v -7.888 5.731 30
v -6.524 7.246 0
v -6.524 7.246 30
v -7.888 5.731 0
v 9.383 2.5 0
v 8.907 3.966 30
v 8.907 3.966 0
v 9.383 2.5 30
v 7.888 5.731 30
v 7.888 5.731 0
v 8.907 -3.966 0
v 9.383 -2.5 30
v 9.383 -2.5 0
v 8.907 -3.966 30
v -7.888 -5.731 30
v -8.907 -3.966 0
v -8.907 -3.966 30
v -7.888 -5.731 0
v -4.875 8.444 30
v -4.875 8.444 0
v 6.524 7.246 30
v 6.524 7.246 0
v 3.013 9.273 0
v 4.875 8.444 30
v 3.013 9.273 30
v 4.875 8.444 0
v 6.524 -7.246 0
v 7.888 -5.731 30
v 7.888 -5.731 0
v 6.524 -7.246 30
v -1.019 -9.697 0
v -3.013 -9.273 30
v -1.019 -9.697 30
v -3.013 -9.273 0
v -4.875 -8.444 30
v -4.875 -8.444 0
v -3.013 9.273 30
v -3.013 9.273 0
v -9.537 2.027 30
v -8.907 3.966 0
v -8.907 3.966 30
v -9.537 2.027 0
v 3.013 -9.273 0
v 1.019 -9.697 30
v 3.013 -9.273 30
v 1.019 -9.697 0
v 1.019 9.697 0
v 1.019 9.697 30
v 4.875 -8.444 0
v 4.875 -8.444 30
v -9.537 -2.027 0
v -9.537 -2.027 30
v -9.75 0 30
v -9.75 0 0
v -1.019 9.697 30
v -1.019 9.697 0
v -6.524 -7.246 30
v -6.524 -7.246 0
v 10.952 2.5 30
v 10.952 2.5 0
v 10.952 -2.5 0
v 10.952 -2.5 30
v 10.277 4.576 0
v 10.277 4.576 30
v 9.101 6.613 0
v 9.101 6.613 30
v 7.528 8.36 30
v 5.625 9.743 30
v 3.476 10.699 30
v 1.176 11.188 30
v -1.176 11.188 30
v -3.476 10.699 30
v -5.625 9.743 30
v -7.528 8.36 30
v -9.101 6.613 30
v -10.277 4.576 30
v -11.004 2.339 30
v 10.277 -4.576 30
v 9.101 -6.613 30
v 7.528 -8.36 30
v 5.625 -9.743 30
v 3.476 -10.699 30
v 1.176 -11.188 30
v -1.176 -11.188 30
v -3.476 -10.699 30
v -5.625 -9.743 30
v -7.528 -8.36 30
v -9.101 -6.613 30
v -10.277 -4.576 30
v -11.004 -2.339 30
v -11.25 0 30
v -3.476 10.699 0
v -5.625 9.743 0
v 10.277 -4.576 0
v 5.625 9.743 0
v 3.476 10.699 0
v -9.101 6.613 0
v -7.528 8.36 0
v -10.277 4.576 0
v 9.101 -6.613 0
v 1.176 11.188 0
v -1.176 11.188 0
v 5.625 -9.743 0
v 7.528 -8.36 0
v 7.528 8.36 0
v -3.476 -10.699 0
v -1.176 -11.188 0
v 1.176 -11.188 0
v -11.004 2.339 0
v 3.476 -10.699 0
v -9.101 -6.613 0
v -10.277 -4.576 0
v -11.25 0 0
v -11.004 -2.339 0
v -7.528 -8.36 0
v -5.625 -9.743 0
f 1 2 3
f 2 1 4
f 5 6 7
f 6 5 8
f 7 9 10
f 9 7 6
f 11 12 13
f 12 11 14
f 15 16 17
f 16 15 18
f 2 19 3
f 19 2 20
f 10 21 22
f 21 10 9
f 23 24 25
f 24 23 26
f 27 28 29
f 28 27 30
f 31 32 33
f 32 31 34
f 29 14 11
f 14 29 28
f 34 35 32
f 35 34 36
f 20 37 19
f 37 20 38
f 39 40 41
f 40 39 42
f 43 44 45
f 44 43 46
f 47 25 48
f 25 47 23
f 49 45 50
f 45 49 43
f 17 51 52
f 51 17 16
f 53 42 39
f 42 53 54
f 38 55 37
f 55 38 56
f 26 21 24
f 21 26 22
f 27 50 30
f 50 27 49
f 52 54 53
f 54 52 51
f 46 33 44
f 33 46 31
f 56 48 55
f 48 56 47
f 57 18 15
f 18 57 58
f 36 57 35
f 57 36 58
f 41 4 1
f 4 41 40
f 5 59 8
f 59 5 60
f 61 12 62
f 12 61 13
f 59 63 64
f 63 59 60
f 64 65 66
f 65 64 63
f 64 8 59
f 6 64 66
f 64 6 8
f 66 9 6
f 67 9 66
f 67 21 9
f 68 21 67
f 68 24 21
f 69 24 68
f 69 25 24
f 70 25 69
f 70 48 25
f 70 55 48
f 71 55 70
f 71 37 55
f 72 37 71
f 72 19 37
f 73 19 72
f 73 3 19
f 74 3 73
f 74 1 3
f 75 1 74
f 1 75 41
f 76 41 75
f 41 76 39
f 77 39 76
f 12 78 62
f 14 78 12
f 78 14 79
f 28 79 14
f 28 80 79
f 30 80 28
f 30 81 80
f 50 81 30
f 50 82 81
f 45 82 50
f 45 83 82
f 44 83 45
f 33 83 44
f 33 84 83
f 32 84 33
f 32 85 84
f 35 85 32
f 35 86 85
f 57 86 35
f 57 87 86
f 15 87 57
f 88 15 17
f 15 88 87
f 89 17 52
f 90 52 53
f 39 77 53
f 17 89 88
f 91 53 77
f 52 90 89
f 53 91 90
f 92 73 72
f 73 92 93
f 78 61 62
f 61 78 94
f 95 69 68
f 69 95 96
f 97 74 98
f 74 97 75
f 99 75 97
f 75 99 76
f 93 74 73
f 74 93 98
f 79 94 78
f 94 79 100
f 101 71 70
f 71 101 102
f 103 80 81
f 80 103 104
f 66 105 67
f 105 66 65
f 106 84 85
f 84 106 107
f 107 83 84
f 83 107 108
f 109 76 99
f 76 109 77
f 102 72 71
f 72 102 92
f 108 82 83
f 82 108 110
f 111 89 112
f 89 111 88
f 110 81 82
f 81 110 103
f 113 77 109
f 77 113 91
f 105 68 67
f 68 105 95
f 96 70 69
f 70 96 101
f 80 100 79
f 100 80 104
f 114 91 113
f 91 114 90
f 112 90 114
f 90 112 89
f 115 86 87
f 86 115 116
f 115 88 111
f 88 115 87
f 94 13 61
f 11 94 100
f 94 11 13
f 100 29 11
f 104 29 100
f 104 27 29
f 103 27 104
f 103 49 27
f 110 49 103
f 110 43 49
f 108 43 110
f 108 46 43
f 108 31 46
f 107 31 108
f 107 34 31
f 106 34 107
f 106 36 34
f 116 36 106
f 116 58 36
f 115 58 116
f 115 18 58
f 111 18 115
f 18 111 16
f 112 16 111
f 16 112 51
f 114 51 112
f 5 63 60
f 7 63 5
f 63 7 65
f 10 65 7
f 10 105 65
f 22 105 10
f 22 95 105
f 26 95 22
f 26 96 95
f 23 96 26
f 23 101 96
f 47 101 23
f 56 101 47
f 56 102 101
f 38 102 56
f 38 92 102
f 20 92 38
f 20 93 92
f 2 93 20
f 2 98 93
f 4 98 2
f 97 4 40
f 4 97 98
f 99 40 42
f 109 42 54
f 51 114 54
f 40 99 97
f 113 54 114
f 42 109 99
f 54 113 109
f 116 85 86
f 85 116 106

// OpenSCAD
module BrakeLeverPadding(height, inner, padding, split=5)
{
  outer = inner + padding;
  extended_height = height + 2;

  difference()
  {
    cylinder(h=height, d=outer);

    translate([0, 0, -1])
    {
      cylinder(h=extended_height, d=inner);

      translate([0, -split/2, 0])
      {
        cube([outer+5, split, extended_height]);
      }
    }
  }
}

BrakeLeverPadding(30, 19.5, 3);
